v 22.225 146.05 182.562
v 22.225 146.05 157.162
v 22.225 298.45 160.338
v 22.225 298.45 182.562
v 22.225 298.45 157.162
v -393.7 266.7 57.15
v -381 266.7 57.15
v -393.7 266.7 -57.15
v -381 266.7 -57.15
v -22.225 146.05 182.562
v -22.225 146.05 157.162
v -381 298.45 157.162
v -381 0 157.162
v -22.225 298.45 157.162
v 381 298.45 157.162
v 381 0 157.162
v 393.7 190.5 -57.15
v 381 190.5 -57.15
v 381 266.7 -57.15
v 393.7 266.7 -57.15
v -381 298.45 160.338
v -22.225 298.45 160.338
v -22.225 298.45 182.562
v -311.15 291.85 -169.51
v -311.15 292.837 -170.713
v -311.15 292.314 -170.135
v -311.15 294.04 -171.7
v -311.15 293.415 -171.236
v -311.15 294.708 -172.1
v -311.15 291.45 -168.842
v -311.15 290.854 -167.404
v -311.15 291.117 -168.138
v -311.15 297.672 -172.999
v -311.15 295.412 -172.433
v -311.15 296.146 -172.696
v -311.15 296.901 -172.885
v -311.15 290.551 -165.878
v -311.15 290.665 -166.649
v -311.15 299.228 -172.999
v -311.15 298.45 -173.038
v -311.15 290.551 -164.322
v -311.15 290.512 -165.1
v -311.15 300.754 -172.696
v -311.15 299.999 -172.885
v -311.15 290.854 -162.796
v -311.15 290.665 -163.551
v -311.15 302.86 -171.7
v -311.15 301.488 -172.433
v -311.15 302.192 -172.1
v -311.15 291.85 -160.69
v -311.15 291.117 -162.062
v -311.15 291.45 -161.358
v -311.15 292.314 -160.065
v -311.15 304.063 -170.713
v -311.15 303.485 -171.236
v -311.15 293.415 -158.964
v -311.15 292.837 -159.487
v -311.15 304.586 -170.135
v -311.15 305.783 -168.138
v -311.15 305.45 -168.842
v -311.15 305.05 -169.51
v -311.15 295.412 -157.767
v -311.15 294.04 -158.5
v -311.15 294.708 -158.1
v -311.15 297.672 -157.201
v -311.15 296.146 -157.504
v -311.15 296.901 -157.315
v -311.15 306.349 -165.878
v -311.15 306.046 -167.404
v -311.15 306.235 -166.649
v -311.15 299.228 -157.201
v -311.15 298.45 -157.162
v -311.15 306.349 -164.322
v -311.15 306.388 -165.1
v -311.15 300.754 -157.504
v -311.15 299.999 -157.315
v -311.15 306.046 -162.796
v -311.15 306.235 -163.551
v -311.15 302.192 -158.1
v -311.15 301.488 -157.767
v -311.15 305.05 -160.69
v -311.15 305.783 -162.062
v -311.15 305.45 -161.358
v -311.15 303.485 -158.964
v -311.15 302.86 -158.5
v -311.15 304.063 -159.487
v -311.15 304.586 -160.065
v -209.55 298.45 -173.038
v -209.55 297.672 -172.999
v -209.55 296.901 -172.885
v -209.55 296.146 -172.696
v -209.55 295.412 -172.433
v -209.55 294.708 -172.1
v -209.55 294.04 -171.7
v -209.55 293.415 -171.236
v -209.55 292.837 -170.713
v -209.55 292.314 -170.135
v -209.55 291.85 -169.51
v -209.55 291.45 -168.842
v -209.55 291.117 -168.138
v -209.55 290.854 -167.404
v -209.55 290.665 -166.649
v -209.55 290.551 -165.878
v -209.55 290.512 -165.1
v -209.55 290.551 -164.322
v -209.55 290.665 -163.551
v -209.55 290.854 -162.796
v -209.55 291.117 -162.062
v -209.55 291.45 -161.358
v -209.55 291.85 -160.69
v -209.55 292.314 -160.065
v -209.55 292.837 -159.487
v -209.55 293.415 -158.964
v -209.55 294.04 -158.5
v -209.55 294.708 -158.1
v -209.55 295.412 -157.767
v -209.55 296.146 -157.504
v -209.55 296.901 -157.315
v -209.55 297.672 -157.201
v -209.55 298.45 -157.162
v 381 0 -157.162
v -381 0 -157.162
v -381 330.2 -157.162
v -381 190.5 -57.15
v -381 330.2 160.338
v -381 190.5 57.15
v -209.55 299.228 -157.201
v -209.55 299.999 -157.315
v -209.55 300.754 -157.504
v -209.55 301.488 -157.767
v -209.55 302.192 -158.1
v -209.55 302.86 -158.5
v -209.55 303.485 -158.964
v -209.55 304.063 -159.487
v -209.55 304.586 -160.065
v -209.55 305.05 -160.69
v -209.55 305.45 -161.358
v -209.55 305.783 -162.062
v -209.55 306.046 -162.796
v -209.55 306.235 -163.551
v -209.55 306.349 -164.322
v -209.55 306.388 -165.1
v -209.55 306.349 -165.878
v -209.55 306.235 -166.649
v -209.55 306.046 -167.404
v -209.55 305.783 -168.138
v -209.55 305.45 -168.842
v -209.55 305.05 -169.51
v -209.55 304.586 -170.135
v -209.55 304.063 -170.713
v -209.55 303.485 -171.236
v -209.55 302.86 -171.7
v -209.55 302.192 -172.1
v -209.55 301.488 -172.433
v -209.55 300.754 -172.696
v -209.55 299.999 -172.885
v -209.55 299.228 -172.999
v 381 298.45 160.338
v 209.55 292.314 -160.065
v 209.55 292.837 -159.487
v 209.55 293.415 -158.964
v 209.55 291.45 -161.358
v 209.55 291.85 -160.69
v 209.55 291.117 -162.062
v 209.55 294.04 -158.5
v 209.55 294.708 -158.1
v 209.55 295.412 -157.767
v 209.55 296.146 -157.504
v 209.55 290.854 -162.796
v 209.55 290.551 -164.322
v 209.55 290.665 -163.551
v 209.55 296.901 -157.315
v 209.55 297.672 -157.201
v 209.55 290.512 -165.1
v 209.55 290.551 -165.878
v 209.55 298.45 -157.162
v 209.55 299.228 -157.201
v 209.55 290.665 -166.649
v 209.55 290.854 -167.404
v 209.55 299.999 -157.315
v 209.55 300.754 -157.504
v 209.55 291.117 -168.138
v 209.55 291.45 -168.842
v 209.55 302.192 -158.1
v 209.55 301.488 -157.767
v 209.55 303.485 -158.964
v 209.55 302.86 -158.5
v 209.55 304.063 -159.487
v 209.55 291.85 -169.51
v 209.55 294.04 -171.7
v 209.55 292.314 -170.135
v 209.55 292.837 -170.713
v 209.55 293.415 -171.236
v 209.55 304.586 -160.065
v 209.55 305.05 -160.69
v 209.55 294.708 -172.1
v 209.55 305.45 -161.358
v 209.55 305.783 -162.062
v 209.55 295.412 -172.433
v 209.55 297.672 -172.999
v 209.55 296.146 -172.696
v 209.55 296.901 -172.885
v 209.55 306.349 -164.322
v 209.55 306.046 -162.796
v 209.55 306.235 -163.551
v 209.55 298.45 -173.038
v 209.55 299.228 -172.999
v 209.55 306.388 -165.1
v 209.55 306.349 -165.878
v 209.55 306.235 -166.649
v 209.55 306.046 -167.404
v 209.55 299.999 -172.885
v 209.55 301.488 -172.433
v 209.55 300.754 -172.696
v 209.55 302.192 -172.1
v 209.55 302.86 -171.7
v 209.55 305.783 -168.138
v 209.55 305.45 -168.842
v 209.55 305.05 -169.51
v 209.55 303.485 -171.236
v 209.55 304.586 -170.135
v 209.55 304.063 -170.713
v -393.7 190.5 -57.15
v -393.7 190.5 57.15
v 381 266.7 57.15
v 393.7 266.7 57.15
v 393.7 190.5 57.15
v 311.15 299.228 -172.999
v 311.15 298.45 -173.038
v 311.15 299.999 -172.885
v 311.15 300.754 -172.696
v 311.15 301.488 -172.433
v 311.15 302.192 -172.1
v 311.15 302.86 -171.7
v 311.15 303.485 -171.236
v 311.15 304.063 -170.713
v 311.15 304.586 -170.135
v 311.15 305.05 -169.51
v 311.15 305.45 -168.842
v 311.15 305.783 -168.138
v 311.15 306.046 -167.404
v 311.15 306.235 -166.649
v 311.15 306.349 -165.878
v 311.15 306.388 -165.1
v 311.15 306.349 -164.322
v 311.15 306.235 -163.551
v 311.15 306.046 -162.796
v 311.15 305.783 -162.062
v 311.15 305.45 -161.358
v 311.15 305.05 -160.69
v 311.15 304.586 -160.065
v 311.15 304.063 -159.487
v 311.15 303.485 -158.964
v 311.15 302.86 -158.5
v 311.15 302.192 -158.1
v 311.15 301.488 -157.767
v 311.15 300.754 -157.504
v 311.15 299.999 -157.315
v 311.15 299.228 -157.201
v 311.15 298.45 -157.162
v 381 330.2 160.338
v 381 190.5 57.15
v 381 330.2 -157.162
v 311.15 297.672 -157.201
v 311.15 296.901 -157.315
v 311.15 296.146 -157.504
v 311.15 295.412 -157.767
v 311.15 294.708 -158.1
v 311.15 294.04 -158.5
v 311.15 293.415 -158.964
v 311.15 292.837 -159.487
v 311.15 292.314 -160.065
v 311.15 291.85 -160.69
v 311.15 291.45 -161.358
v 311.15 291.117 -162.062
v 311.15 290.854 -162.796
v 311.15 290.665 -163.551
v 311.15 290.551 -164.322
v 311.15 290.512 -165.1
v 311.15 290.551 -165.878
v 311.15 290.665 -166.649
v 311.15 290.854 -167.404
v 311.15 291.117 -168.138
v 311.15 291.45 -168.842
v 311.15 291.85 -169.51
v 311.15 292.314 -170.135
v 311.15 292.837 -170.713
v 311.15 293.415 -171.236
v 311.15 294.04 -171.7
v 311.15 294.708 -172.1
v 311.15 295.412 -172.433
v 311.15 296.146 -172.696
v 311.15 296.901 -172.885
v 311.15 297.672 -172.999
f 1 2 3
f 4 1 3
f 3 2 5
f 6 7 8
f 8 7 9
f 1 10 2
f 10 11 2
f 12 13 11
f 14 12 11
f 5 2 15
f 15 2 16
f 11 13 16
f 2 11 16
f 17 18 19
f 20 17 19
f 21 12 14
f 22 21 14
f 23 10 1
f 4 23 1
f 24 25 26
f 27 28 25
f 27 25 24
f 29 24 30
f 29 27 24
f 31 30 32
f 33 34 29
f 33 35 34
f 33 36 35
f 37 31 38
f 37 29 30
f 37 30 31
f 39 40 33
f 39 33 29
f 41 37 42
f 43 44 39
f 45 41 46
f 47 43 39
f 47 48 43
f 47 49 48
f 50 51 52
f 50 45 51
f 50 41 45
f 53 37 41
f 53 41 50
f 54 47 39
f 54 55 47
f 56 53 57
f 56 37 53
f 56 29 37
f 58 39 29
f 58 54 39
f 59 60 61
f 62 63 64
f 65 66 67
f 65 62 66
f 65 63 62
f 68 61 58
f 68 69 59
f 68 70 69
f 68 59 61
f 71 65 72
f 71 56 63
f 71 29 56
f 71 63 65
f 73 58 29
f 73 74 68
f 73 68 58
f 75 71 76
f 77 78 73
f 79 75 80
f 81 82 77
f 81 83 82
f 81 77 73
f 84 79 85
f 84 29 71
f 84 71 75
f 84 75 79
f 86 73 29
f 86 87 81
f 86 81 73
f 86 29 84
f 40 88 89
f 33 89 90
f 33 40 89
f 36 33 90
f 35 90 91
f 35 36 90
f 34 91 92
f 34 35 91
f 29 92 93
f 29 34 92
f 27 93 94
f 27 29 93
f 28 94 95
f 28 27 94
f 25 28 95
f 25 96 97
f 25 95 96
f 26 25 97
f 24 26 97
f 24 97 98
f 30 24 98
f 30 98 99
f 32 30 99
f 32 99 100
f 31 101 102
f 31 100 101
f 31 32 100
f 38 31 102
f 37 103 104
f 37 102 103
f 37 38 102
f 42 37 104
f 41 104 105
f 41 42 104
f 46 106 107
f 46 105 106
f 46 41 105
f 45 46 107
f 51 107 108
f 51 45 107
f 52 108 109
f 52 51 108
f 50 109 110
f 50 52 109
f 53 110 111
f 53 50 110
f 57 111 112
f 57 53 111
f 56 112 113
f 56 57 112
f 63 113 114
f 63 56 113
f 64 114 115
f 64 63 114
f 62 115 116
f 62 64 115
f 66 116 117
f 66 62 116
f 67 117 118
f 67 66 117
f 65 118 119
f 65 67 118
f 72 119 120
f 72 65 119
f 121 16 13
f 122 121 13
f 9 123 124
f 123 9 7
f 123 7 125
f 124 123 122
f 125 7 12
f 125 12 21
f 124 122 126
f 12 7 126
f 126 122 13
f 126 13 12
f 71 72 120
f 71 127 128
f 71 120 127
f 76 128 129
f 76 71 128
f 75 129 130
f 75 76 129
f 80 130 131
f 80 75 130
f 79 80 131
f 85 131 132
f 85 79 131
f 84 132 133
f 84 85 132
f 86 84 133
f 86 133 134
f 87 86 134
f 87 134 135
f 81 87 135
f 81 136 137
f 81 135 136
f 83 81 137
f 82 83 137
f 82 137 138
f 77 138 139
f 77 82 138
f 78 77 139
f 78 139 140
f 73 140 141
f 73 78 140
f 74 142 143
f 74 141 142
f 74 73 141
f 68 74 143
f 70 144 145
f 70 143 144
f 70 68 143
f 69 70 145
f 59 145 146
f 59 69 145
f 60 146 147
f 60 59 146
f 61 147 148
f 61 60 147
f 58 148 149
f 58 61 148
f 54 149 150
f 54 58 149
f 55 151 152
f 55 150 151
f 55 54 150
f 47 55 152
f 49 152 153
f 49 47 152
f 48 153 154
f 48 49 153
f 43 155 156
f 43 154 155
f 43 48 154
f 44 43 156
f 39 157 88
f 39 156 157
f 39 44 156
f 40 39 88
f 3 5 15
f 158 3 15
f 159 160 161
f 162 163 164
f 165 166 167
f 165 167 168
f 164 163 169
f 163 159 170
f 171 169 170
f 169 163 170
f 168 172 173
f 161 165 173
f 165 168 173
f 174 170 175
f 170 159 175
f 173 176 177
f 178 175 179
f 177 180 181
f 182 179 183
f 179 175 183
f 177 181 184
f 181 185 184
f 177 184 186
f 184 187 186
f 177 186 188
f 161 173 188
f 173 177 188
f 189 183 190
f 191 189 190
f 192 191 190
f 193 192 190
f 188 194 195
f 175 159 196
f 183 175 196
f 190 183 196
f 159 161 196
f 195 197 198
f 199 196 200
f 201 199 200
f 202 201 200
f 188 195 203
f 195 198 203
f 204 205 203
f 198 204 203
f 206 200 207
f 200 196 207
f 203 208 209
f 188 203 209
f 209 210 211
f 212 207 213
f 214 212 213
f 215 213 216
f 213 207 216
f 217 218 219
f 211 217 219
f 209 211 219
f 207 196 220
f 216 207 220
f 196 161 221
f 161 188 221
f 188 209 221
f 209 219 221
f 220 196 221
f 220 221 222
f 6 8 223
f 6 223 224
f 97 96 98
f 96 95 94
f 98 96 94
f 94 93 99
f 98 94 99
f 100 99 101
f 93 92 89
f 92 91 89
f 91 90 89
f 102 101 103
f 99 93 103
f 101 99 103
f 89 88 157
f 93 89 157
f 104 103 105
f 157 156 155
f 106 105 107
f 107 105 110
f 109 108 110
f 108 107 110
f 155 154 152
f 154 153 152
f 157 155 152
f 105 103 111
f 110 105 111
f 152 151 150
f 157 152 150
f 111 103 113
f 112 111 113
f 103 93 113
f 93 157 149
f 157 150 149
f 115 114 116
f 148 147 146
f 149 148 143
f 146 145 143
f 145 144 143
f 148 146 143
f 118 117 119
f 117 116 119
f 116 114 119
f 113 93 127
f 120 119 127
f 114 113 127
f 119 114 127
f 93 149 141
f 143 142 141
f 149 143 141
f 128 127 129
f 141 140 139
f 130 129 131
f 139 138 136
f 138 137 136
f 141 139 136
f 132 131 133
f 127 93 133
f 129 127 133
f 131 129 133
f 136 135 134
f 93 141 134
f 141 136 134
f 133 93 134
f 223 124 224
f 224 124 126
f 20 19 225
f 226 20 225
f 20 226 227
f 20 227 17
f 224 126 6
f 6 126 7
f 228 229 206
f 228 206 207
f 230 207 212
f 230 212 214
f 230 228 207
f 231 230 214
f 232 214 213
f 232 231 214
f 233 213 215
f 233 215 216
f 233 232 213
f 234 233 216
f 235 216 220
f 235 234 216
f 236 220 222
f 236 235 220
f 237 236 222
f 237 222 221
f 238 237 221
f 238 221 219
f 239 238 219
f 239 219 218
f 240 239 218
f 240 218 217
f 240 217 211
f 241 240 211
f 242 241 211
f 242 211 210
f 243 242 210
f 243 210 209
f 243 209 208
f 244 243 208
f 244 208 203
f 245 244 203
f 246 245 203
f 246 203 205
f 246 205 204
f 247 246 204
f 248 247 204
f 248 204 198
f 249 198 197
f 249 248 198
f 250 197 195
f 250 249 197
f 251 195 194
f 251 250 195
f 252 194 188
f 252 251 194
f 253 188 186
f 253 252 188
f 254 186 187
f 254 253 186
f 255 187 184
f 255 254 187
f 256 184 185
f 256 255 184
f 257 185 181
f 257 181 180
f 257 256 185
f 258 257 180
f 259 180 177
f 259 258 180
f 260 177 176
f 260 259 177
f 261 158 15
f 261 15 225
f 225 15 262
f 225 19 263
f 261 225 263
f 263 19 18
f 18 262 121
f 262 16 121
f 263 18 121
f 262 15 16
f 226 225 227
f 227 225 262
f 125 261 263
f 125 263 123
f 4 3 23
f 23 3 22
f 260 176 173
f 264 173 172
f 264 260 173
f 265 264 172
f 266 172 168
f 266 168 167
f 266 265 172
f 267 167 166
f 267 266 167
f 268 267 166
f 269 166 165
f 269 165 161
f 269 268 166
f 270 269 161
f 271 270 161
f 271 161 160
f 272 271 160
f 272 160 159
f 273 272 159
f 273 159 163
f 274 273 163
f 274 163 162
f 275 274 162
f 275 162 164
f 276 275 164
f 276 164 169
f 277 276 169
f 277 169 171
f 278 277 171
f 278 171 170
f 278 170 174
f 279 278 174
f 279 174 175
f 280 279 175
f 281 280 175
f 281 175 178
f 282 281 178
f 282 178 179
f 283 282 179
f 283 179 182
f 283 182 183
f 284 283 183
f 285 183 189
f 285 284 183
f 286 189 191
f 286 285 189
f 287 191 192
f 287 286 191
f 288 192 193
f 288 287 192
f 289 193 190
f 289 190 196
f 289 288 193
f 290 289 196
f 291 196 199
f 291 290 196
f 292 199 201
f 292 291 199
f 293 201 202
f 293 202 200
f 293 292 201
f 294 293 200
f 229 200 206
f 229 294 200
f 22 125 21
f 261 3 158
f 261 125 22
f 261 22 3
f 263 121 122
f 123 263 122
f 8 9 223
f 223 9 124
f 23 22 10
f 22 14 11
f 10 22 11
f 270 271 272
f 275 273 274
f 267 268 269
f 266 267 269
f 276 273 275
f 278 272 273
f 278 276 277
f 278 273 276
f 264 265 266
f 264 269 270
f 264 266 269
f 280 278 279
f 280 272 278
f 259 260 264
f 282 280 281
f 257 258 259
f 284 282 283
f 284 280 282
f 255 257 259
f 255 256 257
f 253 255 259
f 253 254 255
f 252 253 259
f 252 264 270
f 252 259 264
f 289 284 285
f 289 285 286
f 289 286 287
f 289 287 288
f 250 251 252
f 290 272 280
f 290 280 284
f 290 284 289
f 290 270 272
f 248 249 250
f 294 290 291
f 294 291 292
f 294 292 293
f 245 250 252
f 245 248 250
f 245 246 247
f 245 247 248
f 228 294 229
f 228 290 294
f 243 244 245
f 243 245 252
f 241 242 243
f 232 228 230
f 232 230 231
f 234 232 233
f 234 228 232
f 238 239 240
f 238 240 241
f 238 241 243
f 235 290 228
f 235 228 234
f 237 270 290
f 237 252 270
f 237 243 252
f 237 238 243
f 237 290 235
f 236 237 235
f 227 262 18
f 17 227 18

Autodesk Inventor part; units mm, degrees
ref_plane "YZ Plane" through (0, 0, 0) normal (1, 0, 0) x (0, 1, 0)
ref_plane "XZ Plane" through (0, 0, 0) normal (0, 1, 0) x (-1, 0, 0)
sketch "Sketch1" plane through (0, 0, 0) normal (0, 1, 0) x (-1, 0, 0)
  line L0 (381, 157.1625) -> (-381, 157.1625)
  line L1 (-381, 157.1625) -> (-381, -157.1625)
  line L2 (-381, -157.1625) -> (381, -157.1625)
  line L3 (381, -157.1625) -> (381, 157.1625)
  line L4 (381, 157.1625) -> (-381, -157.1625) construction
  line L5 (-381, 157.1625) -> (381, -157.1625) construction
  point P0 (0, 0)
  dimension "d0" = 762
  dimension "d1" = 314.325
extrude "Extrusion1" add sketch "Sketch1" along normal blind 330.2
sketch "Sketch2" plane through (0, 330.2, 0) normal (0, 1, 0) x (1, 0, 0)
  line L0 (-381, 157.1625) -> (-381, -157.1625) projected
  line L1 (381, 157.1625) -> (-381, 157.1625) projected
  line L2 (381, -157.1625) -> (381, 157.1625) projected
  line L3 (-381, -157.1625) -> (-381, -160.3375)
  line L4 (-381, -160.3375) -> (381, -160.3375)
  line L5 (381, -160.3375) -> (381, -157.1625)
  point P0 (0, 0)
  dimension "d4" = 3.175
extrude "Extrusion2" add sketch "Sketch2" against normal blind 31.75
sketch "Sketch3" plane through (-381, 0, 157.1625) normal (0, 0, 1) x (1, 0, 0)
  line L0 (358.775, 146.05) -> (403.225, 146.05)
  line L1 (403.225, 146.05) -> (403.225, 298.45)
  line L2 (403.225, 298.45) -> (358.775, 298.45)
  line L3 (358.775, 298.45) -> (358.775, 146.05)
  line L4 (762, 298.45) -> (0, 298.45) construction
  point P0 (381, 0)
  point P1 (381, 146.05)
  dimension "d7" = 44.45
  dimension "d8" = 146.05
extrude "Extrusion3" add sketch "Sketch3" along normal blind 25.4
sketch "Sketch4" plane through (381, 0, 157.1625) normal (1, 0, 0) x (0, 0, -1)
  line L0 (100.0125, 190.5) -> (214.3125, 190.5)
  line L1 (214.3125, 190.5) -> (214.3125, 266.7)
  line L2 (214.3125, 266.7) -> (100.0125, 266.7)
  line L3 (100.0125, 266.7) -> (100.0125, 190.5)
  point P0 (157.1625, 0)
  point P1 (157.1625, 190.5)
  dimension "d11" = 114.3
  dimension "d12" = 190.5
  dimension "d13" = 76.2
extrude "Extrusion4" add sketch "Sketch4" along normal blind 12.7
ref_plane "Work Plane1" through (311.15, 0, 157.1625) normal (1, 0, 0) x (0, 0, -1)
sketch "Sketch5" plane through (311.15, 0, 157.1625) normal (1, 0, 0) x (0, 0, -1)
  line L0 (314.325, 0) -> (314.325, 330.2) construction
  line L1 (0, 298.45) -> (-3.175, 298.45) construction
  circle A0 centre (322.2625, 298.45) radius 7.9375
  point P0 (157.1625, 0)
  dimension "d17" = 15.875
extrude "Extrusion5" add sketch "Sketch5" against normal blind 101.6
mirror "Mirror1" about plane through (0, 0, 0) normal (1, 0, 0) of "Extrusion5", "Extrusion4"
properties part number "Aluminum tool box" material "Aluminum 6061"
